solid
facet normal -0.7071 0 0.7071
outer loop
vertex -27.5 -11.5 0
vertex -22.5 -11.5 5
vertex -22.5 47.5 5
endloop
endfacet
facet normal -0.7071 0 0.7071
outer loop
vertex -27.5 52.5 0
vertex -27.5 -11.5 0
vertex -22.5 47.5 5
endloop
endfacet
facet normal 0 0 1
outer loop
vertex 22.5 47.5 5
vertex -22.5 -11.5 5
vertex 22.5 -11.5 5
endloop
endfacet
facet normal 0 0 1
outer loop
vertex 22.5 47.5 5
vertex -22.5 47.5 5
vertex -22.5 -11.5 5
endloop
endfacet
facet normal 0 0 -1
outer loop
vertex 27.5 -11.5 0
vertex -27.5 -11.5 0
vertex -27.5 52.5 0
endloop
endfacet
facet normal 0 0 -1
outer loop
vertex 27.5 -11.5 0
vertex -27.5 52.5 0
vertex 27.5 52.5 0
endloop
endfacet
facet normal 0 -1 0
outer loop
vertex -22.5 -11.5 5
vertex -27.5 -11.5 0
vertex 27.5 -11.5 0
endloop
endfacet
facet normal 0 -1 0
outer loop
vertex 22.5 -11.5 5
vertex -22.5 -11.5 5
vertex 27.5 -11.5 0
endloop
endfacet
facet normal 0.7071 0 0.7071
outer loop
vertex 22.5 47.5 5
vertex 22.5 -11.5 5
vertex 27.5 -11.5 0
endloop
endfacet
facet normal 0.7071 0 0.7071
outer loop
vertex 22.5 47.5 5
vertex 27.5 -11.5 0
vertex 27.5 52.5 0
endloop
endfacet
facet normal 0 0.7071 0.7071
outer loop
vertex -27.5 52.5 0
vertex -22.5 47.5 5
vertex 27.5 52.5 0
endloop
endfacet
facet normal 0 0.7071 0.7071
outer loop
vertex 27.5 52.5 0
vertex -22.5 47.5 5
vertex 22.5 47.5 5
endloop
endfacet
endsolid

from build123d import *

# Parameters (mm, degrees)
F0_W     = 55
F0_H     = 64
F1_DEPTH = 5
F2_SIZE  = 4.99999


# Not quite as in the source:
# - a fillet or chamfer is up to 0.001 mm smaller than in the source, because OpenCascade refuses the exact size


with BuildPart() as f1:
    # F0 (on Top) → F1 (new body)
    with BuildSketch(Plane.XY):
        with Locations((0, 20.5)):
            Rectangle(F0_W, F0_H)
    extrude(amount=F1_DEPTH)

    # F2 (size 5 in the source; OpenCascade refuses exactly that, so slightly less here)
    f2_edges = [f1.edges().sort_by_distance(p)[0] for p in [
        (-27.5, 20.5, 5),
        (0, 52.5, 5),
        (27.5, 20.5, 5),
    ]]
    chamfer(f2_edges, length=F2_SIZE)


solid = f1.part
